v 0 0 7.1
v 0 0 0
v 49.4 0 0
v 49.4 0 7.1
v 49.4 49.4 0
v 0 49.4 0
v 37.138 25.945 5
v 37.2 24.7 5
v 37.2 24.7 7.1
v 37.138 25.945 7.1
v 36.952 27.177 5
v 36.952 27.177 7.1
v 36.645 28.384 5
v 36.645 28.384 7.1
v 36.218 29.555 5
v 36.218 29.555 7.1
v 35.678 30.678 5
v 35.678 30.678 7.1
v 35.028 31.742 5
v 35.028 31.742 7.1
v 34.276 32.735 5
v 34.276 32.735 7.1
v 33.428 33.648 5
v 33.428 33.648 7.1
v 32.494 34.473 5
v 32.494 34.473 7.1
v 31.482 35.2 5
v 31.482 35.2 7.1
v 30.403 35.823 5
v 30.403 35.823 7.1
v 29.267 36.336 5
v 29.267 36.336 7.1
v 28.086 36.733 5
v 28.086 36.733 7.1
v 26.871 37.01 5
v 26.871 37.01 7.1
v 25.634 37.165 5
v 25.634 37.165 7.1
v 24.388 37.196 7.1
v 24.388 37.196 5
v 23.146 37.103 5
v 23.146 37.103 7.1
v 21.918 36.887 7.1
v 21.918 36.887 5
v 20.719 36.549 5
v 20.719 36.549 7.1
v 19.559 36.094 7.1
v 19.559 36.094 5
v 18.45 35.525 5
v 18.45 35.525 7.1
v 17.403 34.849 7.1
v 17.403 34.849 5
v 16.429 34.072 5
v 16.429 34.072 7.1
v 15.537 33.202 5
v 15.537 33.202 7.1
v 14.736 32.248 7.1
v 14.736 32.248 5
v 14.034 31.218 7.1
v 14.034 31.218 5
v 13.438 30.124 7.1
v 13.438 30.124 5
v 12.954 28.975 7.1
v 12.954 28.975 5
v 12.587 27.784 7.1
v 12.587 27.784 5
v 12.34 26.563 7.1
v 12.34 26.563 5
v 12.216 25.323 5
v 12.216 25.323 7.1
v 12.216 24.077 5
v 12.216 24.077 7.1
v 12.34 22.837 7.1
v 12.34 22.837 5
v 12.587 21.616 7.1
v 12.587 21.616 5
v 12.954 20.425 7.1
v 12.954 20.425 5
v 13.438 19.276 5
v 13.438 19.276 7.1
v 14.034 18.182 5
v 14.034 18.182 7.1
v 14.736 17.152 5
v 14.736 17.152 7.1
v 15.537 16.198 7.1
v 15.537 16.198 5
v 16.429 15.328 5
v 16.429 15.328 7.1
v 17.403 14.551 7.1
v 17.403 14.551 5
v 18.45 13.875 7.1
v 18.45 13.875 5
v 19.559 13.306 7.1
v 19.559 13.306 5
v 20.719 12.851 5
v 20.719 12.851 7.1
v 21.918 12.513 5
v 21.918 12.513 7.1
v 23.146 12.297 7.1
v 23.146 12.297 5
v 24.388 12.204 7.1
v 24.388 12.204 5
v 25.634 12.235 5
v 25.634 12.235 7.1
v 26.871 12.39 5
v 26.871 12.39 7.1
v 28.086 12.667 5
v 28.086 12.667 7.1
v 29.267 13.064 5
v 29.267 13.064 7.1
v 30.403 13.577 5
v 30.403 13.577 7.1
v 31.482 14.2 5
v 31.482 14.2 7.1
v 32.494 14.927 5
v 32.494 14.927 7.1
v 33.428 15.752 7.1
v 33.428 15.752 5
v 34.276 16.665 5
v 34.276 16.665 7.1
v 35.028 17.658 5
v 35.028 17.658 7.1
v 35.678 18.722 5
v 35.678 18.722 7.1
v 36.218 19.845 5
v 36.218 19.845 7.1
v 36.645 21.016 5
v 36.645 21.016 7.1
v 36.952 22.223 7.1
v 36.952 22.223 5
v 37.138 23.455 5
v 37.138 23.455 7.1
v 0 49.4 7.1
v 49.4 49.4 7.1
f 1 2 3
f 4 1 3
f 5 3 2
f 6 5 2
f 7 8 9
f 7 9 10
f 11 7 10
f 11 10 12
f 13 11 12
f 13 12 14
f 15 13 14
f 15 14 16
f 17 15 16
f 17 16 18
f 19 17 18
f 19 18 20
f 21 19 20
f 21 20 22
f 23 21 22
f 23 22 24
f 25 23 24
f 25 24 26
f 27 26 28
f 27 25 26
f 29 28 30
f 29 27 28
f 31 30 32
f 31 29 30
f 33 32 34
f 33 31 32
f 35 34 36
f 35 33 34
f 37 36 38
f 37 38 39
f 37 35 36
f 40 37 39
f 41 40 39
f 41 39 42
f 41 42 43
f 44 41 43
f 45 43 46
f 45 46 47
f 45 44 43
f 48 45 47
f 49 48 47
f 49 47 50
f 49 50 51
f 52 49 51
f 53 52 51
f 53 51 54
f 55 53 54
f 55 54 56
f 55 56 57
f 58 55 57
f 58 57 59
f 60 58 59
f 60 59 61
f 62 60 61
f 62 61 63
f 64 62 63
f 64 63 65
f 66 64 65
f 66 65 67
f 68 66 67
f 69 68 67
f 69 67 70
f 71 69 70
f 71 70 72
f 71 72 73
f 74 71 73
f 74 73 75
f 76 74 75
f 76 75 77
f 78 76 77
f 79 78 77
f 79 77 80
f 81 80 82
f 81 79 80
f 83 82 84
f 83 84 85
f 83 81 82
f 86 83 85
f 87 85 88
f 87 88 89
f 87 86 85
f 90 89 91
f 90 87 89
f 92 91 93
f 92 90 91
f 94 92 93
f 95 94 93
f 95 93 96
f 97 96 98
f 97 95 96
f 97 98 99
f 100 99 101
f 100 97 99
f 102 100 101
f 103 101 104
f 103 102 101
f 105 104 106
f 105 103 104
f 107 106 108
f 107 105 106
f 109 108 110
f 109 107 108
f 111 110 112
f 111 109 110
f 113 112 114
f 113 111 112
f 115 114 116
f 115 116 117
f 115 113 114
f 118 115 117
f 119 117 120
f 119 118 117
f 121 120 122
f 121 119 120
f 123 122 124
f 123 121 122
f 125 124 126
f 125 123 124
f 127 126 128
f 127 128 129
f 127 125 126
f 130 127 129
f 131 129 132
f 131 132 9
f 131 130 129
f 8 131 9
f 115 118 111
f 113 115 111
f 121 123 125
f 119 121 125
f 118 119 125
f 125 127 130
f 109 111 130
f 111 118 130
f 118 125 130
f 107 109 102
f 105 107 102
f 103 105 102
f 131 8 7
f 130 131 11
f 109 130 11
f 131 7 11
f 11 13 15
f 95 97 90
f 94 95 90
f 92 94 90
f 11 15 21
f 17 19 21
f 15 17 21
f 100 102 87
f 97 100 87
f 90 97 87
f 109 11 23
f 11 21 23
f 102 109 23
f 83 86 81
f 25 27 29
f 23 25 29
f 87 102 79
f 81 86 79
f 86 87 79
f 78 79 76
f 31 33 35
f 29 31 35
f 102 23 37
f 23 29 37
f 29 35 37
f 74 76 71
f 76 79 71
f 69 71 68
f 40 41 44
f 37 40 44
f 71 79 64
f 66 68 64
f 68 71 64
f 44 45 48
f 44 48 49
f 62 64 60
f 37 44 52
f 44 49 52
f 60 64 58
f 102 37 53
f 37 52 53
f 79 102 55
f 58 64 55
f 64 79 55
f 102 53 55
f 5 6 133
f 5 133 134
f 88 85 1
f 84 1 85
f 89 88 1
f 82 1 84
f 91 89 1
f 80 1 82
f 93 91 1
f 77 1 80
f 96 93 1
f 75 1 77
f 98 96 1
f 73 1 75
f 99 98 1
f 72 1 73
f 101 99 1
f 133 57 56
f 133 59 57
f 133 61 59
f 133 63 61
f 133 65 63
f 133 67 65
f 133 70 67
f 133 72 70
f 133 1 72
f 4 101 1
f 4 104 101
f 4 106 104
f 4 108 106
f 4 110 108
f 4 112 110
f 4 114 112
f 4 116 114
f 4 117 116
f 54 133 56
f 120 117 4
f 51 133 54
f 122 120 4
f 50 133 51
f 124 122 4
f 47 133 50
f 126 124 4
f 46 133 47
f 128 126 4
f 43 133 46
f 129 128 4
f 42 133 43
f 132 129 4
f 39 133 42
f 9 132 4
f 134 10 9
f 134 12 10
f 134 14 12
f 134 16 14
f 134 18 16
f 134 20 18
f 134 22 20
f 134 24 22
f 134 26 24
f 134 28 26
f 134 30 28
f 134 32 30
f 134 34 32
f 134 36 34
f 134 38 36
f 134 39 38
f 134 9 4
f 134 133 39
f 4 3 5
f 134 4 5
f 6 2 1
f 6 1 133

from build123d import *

# Parameters (mm, degrees)
SKETCH1_W           = 49.4
SKETCH1_H           = 49.4
SKETCH1_R           = 12.5
BOSS_EXTRUDE1_DEPTH = 7.1
SKETCH5_R           = 12.5
BOSS_EXTRUDE2_DEPTH = 5


with BuildPart() as part:
    # Sketch1 → Boss-Extrude1 (new body)
    with BuildSketch(Plane.XY):
        with Locations((24.7, 24.7)):
            Rectangle(SKETCH1_W, SKETCH1_H)
        with Locations((24.7, 24.7)):
            Circle(SKETCH1_R, mode=Mode.SUBTRACT)
    extrude(amount=BOSS_EXTRUDE1_DEPTH)

    # Sketch5 → Boss-Extrude2 (add)
    with BuildSketch(Plane(origin=(0, 0, 0), x_dir=(-1, 0, 0), z_dir=(0, 0, -1))):
        with Locations((-24.7, 24.7)):
            Circle(SKETCH5_R)
    extrude(amount=-BOSS_EXTRUDE2_DEPTH)


solid = part.part
